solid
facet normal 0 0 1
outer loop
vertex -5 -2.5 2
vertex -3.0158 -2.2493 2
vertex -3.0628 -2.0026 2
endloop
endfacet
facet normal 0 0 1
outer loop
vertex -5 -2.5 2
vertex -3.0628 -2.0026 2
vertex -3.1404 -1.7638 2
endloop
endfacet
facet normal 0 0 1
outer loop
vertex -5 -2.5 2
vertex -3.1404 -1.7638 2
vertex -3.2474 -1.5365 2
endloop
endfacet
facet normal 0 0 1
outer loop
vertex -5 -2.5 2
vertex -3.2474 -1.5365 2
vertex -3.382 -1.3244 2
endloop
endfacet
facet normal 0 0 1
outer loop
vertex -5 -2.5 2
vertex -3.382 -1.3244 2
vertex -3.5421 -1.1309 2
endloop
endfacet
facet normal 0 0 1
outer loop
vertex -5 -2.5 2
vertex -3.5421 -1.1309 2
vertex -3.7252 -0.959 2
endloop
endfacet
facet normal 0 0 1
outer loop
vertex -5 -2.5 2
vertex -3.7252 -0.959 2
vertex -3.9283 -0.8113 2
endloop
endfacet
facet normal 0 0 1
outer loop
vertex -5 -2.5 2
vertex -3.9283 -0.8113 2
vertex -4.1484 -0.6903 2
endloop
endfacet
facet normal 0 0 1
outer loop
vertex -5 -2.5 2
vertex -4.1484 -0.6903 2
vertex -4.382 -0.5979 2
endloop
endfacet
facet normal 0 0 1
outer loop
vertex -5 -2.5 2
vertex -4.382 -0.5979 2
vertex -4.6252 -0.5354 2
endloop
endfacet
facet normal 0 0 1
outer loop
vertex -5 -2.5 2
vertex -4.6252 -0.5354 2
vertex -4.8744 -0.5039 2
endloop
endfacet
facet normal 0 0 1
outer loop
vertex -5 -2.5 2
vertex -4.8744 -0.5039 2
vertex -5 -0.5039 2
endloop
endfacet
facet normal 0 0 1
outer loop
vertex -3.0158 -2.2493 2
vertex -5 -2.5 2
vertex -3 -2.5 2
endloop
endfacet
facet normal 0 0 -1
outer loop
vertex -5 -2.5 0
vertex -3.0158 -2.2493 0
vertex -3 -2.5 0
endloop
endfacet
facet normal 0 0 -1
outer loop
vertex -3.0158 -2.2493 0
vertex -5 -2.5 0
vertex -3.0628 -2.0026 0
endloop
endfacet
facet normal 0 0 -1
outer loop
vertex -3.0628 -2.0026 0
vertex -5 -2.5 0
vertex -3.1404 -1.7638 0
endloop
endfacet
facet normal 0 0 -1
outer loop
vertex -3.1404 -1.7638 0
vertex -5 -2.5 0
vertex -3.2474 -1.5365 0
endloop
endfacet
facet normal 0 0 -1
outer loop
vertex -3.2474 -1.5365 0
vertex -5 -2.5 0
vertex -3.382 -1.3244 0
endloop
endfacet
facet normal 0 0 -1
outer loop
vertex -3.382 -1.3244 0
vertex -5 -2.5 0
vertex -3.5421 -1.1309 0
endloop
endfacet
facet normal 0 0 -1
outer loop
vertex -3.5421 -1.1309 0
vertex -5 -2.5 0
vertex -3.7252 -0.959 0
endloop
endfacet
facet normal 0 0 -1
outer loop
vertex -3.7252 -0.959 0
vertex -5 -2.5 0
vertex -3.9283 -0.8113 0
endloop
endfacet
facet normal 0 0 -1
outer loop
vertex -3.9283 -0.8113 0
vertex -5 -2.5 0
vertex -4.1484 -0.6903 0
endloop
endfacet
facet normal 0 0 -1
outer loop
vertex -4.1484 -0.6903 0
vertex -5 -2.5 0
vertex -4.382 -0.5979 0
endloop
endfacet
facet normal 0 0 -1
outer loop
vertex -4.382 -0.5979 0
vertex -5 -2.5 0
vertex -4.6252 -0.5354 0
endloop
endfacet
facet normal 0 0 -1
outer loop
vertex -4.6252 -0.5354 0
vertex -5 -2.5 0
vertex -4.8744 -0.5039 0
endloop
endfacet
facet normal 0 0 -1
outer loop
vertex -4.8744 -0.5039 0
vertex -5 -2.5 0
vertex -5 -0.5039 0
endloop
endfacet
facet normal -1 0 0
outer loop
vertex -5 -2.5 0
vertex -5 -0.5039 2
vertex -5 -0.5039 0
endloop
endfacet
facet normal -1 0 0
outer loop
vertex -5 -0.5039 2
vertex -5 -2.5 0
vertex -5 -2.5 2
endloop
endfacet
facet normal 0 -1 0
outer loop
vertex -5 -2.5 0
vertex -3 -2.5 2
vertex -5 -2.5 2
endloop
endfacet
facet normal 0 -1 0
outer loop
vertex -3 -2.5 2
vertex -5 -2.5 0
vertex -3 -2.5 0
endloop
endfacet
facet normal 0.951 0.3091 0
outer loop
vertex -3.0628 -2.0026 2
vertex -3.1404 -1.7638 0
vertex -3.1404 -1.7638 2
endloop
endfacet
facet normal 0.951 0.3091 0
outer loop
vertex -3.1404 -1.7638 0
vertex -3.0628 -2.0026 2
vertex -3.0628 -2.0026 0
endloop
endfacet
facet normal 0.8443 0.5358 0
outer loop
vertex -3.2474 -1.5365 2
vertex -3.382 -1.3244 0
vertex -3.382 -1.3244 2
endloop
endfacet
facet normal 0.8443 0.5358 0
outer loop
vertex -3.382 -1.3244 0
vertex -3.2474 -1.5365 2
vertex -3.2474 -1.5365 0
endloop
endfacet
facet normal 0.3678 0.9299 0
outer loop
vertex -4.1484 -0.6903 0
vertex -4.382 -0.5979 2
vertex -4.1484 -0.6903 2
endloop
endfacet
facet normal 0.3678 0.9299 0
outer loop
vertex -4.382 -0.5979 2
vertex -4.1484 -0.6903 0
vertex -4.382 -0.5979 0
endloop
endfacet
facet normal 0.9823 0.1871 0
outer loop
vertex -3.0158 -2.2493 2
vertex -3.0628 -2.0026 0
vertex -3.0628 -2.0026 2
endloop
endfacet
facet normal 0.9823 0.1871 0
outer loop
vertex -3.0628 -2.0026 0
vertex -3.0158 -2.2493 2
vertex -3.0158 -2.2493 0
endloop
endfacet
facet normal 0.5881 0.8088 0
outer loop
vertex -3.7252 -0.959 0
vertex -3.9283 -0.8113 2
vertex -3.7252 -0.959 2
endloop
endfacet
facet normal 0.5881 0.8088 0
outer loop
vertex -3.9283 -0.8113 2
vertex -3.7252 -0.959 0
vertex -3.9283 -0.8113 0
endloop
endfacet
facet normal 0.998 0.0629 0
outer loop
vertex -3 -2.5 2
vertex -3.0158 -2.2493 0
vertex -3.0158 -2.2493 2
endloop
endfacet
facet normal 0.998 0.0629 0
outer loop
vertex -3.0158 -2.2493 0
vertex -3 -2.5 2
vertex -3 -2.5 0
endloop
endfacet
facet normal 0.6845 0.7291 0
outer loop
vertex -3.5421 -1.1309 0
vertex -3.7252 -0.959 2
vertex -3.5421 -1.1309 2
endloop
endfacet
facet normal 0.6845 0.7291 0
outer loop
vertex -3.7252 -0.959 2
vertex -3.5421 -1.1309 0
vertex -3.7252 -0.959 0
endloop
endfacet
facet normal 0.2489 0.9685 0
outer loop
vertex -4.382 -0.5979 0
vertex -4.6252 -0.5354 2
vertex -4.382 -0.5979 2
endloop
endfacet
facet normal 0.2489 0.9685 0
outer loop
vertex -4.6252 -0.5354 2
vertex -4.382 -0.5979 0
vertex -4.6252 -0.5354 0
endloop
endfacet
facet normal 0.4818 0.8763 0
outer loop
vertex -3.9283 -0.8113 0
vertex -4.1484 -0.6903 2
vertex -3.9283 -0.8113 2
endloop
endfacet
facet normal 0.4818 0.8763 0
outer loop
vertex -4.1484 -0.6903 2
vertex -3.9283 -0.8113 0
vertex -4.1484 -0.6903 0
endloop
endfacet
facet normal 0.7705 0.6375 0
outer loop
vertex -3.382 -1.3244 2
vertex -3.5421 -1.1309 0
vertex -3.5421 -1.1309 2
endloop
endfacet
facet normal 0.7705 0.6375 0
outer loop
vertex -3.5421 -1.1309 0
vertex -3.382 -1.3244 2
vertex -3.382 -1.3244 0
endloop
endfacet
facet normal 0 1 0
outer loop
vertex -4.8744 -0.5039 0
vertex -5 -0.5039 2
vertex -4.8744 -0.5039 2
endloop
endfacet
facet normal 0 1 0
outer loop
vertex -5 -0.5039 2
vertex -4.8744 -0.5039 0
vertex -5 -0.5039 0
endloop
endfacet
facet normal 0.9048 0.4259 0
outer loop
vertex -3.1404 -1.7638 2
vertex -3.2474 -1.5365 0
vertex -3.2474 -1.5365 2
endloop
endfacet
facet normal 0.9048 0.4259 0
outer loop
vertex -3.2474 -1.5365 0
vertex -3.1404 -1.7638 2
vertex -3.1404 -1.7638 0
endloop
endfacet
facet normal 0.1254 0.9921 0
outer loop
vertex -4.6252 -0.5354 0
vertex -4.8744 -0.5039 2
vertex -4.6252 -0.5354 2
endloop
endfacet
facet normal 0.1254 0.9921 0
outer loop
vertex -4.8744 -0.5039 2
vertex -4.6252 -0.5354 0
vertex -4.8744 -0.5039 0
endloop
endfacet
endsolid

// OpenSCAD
//projection()
intersection(){
 union(){
    // translate([0,0, thickness/4]) 
      cube(size = [27, 10, 2]);//, center = true);
     translate([-5,-2.5, 0]) 
     cube(size = [5, 15, 2]);//, center = true);
        
        
    }
     union(){
         translate([-5,-2.5, 0]) 
         cylinder(h = 5, r1 = 2, r2 = 2, center =true, $fn=50);
     }
}
